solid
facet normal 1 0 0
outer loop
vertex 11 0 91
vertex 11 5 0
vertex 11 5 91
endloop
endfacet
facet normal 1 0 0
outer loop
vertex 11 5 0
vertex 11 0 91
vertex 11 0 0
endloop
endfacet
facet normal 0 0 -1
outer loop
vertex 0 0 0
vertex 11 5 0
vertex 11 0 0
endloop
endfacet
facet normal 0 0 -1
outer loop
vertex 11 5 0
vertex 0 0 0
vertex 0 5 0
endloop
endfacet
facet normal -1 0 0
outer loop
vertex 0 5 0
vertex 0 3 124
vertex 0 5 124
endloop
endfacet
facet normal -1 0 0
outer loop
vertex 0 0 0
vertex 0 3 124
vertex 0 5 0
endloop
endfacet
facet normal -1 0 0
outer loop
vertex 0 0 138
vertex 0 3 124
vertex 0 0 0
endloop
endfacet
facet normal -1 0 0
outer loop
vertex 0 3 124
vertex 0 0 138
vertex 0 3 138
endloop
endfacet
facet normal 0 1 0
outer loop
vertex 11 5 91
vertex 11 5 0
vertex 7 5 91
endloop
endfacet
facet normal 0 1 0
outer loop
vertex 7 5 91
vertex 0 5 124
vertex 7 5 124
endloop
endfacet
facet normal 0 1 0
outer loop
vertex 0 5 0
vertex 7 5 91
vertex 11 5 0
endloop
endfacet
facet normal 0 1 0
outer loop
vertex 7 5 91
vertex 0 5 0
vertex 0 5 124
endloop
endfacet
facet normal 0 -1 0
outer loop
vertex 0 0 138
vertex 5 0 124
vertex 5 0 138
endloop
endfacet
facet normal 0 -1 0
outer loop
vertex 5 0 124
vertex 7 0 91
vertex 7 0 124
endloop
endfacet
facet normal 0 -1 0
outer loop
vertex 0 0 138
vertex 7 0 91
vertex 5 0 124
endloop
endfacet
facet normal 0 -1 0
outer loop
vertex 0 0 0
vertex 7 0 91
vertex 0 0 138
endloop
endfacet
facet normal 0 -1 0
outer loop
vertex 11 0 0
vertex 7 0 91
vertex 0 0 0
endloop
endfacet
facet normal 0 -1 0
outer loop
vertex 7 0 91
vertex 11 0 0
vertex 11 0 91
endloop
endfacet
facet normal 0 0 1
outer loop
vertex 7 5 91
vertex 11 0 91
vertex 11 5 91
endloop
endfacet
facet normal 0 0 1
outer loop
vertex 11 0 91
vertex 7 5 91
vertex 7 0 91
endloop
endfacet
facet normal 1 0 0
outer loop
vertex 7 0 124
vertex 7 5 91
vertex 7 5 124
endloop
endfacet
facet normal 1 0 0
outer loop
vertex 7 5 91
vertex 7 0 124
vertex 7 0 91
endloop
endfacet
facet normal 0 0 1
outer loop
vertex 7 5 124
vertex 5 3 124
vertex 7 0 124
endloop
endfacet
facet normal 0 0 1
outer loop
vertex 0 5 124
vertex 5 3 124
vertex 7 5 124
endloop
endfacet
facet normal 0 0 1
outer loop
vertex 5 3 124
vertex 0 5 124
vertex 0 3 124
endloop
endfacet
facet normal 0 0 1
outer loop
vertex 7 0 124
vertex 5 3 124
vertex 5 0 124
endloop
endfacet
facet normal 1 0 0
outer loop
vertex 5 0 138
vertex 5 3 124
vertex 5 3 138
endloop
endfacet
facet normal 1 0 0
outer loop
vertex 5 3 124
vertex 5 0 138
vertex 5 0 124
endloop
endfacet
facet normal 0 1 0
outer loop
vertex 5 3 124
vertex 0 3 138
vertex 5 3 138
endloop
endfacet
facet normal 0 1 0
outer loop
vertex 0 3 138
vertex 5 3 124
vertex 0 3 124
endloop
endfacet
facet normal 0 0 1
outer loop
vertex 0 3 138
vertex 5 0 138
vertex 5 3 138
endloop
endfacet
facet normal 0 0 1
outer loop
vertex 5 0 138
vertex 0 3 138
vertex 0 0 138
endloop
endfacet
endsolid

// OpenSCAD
translate([5.5, 2.5, 3.5]) color([0.6885400040337084, 0.1822211451841942, 0.4756054792846598]) cube([11, 5, 7], center=true);
translate([5.5, 2.5, 10.5]) color([0.9227697282783401, 0.6276391005616293, 0.021845499237729826]) cube([11, 5, 7], center=true);
translate([5.5, 2.5, 17.5]) color([0.9138811115397377, 0.7998245566512758, 0.11577939883887689]) cube([11, 5, 7], center=true);
translate([5.5, 2.5, 24.5]) color([0.25648877124056624, 0.6535669902031535, 0.8172732193081321]) cube([11, 5, 7], center=true);
translate([5.5, 2.5, 31.5]) color([0.644940669440128, 0.11510934585231414, 0.15444013683803237]) cube([11, 5, 7], center=true);
translate([5.5, 2.5, 38.5]) color([0.8512397484375114, 0.04229760200279409, 0.20573574066904754]) cube([11, 5, 7], center=true);
translate([5.5, 2.5, 45.5]) color([0.25966938255992333, 0.31471323182063216, 0.3668937976542025]) cube([11, 5, 7], center=true);
translate([5.5, 2.5, 52.5]) color([0.5674677931506273, 0.849437788441811, 0.8463599216128499]) cube([11, 5, 7], center=true);
translate([5.5, 2.5, 59.5]) color([0.9612029098073006, 0.6075964991402765, 0.49448567414550215]) cube([11, 5, 7], center=true);
translate([5.5, 2.5, 66.5]) color([0.6441434540056448, 0.45866436243162445, 0.4354406175944898]) cube([11, 5, 7], center=true);
translate([5.5, 2.5, 73.5]) color([0.8714107315087972, 0.17828831976535986, 0.3755789219373874]) cube([11, 5, 7], center=true);
translate([5.5, 2.5, 80.5]) color([0.2910354883141598, 0.1384569492267308, 0.27137343088841726]) cube([11, 5, 7], center=true);
translate([5.5, 2.5, 87.5]) color([0.3375110685052213, 0.3672014751918571, 0.09370751185905901]) cube([11, 5, 7], center=true);
translate([3.5, 2.5, 92.5]) color([0.7794169159273662, 0.03566546768846324, 0.26962214085355807]) cube([7, 5, 3], center=true);
translate([3.5, 2.5, 95.5]) color([0.14941603676910742, 0.583451176356754, 0.36090661134415847]) cube([7, 5, 3], center=true);
translate([3.5, 2.5, 98.5]) color([0.9893030267095886, 0.12964093903755392, 0.11489641277540219]) cube([7, 5, 3], center=true);
translate([3.5, 2.5, 101.5]) color([0.7305217328645741, 0.933754079403403, 0.30787976219942303]) cube([7, 5, 3], center=true);
translate([3.5, 2.5, 104.5]) color([0.8570365795720385, 0.7286607479368364, 0.3026706606385793]) cube([7, 5, 3], center=true);
translate([3.5, 2.5, 107.5]) color([0.8355597356596641, 0.2992255048060537, 0.1086514152541781]) cube([7, 5, 3], center=true);
translate([3.5, 2.5, 110.5]) color([0.5608299889315482, 0.4811722969562161, 0.3370805445376659]) cube([7, 5, 3], center=true);
translate([3.5, 2.5, 113.5]) color([0.7978743610995221, 0.8123286615584164, 0.12432480215345709]) cube([7, 5, 3], center=true);
translate([3.5, 2.5, 116.5]) color([0.11600806340273684, 0.49773452003699037, 0.03782437966691787]) cube([7, 5, 3], center=true);
translate([3.5, 2.5, 119.5]) color([0.3350819106008931, 0.6871104903101904, 0.1556641006446543]) cube([7, 5, 3], center=true);
translate([3.5, 2.5, 122.5]) color([0.16655617674247947, 0.5644873855678092, 0.8061184955728092]) cube([7, 5, 3], center=true);
translate([2.5, 1.5, 125.0]) color([0.9914997491156944, 0.08692177434142434, 0.8077725699891862]) cube([5, 3, 2], center=true);
translate([2.5, 1.5, 127.0]) color([0.19804028235278703, 0.22105871931579824, 0.38481190061458204]) cube([5, 3, 2], center=true);
translate([2.5, 1.5, 129.0]) color([0.09807651038324794, 0.5564746075794378, 0.289820808533909]) cube([5, 3, 2], center=true);
translate([2.5, 1.5, 131.0]) color([0.9201526827262252, 0.7882887690133504, 0.714406368727256]) cube([5, 3, 2], center=true);
translate([2.5, 1.5, 133.0]) color([0.21725354658840645, 0.08366324281939452, 0.2201378642652858]) cube([5, 3, 2], center=true);
translate([2.5, 1.5, 135.0]) color([0.9991066326269249, 0.5852279869996022, 0.1665811123789923]) cube([5, 3, 2], center=true);
translate([2.5, 1.5, 137.0]) color([0.1919450116047291, 0.1150124003280546, 0.8219806914298157]) cube([5, 3, 2], center=true);
